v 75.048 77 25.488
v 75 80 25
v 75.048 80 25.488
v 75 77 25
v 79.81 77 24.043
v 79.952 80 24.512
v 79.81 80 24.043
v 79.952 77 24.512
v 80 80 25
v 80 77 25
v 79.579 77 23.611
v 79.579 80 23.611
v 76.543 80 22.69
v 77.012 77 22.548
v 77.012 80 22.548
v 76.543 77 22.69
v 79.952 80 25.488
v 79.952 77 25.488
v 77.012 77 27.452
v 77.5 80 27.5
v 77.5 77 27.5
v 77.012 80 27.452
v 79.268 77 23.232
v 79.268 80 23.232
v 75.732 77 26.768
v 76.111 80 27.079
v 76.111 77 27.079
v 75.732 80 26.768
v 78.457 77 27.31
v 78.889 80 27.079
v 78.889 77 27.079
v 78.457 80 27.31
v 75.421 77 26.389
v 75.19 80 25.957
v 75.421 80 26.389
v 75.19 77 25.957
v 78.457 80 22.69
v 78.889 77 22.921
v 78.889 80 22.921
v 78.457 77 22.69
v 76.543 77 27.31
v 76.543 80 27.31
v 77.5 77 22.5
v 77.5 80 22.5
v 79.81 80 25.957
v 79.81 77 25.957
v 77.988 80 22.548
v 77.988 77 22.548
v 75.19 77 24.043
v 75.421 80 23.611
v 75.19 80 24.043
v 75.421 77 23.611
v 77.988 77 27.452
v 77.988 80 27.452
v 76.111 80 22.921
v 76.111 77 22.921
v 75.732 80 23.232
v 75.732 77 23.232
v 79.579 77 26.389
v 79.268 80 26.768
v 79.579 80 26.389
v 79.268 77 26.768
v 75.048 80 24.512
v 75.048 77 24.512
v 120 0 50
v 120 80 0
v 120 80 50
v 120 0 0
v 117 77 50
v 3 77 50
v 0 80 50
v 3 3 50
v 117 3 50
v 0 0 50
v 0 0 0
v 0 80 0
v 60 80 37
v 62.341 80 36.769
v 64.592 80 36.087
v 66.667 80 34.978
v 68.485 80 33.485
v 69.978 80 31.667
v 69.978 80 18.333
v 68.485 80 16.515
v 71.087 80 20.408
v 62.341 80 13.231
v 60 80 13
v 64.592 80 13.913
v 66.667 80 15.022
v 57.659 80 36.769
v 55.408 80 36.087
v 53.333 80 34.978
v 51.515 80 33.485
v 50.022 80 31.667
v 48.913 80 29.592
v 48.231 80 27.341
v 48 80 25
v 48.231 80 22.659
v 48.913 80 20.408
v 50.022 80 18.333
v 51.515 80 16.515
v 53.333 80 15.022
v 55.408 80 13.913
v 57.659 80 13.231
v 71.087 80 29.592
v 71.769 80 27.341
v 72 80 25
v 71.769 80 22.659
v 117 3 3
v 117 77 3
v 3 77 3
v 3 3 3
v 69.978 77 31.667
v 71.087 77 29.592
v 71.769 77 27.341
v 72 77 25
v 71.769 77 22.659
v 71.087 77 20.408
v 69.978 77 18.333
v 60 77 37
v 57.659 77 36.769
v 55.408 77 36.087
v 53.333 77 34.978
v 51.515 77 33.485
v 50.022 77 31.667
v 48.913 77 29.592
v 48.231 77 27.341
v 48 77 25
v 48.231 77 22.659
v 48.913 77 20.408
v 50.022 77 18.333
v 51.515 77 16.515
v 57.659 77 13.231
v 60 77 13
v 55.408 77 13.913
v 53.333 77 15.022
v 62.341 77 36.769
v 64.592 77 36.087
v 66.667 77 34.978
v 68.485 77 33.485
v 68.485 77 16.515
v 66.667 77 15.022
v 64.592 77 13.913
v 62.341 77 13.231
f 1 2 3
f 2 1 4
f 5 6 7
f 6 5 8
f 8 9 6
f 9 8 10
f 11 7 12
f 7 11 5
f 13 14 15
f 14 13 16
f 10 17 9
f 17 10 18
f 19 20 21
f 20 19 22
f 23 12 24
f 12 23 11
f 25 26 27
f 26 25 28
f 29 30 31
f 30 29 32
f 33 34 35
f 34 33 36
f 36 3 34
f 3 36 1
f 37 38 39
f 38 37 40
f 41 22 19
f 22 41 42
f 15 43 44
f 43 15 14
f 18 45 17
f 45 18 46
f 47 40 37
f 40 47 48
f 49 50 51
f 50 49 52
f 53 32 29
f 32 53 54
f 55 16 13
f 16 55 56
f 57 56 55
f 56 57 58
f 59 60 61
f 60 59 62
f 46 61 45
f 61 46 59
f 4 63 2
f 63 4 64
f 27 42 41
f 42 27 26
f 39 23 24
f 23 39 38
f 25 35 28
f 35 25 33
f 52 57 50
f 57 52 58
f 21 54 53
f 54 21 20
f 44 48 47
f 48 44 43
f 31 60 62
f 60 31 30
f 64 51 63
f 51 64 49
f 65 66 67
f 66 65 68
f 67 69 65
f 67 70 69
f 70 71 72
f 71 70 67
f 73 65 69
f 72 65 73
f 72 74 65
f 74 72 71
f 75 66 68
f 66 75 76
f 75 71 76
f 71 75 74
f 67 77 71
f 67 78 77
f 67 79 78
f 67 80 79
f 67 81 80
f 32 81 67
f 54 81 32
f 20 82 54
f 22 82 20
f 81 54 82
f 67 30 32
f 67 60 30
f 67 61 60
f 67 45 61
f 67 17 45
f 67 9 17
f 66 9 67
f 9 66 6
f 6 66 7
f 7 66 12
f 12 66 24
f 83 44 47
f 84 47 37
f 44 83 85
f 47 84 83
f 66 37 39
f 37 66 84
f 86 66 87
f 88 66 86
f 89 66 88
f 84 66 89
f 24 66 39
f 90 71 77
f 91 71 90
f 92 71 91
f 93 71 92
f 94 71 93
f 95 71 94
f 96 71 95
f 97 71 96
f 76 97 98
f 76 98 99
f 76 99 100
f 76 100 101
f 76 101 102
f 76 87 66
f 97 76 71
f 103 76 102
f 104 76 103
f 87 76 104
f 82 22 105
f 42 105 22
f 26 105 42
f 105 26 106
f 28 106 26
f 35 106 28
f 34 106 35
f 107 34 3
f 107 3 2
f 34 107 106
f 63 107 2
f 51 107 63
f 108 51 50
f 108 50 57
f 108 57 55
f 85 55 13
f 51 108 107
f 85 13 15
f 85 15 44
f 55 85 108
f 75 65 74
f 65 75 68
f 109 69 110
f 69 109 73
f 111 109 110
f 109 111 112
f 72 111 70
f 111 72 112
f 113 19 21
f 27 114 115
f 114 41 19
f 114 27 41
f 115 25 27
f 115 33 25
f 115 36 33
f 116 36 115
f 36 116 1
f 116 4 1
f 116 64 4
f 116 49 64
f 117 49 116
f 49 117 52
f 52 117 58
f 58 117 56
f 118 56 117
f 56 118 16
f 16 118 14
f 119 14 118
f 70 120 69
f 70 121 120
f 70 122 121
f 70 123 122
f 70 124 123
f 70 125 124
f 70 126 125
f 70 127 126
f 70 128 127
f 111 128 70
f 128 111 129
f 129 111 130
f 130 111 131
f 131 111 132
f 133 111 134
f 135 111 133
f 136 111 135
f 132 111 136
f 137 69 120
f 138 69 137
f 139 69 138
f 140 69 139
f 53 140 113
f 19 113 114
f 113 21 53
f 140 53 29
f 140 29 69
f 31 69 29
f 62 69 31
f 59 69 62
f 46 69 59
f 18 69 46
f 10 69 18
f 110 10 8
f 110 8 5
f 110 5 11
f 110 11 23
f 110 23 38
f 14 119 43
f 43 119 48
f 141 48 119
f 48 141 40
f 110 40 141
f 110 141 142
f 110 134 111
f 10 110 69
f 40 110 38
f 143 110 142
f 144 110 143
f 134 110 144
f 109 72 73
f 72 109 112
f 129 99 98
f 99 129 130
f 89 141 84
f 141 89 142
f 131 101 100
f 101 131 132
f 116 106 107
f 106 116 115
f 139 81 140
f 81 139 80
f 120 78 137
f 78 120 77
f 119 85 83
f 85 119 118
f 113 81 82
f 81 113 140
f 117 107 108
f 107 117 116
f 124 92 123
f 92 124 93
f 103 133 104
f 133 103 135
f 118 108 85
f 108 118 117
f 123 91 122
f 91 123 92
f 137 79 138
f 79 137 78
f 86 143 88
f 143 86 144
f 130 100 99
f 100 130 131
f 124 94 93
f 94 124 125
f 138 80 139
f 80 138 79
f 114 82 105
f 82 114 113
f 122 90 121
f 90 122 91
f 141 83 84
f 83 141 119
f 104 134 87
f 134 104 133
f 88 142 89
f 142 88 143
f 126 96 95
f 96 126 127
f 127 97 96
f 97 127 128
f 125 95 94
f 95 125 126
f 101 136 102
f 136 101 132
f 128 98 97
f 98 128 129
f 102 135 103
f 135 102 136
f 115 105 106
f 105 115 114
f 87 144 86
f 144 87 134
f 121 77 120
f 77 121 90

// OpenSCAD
$fn = 32;

// ----------------------------------------------------------------------
// Vent box: roundvent enclosure
// ----------------------------------------------------------------------

// --- parameters (mm) ---
box_l = 120;              // box length, X
box_w = 80;               // box width, Y
box_h = 50;               // box height, Z
wall_t = 3;               // shell wall thickness
vent_d = 24;              // central vent diameter
ring_d = 5;               // ring hole diameter
n_ring = 6;               // holes in the ring
ring_r = 17.5;            // ring radius

ring_step = 360 / n_ring;  // ring hole angular step

difference() {
  cube([box_l, box_w, box_h]);
  translate([wall_t, wall_t, wall_t])
    cube([box_l - 2 * wall_t, box_w - 2 * wall_t, box_h]);
  translate([box_l / 2, box_w - wall_t - 1, box_h / 2])
    rotate([-90, 0, 0]) cylinder(h = wall_t + 2, d = vent_d);
  for (i = [0 : n_ring - 1])
    translate([box_l / 2, box_w - wall_t - 1, box_h / 2])
      rotate([0, 0, i * ring_step])
        translate([ring_r, 0, 0]) rotate([-90, 0, 0])
          cylinder(h = wall_t + 2, d = ring_d);
}
